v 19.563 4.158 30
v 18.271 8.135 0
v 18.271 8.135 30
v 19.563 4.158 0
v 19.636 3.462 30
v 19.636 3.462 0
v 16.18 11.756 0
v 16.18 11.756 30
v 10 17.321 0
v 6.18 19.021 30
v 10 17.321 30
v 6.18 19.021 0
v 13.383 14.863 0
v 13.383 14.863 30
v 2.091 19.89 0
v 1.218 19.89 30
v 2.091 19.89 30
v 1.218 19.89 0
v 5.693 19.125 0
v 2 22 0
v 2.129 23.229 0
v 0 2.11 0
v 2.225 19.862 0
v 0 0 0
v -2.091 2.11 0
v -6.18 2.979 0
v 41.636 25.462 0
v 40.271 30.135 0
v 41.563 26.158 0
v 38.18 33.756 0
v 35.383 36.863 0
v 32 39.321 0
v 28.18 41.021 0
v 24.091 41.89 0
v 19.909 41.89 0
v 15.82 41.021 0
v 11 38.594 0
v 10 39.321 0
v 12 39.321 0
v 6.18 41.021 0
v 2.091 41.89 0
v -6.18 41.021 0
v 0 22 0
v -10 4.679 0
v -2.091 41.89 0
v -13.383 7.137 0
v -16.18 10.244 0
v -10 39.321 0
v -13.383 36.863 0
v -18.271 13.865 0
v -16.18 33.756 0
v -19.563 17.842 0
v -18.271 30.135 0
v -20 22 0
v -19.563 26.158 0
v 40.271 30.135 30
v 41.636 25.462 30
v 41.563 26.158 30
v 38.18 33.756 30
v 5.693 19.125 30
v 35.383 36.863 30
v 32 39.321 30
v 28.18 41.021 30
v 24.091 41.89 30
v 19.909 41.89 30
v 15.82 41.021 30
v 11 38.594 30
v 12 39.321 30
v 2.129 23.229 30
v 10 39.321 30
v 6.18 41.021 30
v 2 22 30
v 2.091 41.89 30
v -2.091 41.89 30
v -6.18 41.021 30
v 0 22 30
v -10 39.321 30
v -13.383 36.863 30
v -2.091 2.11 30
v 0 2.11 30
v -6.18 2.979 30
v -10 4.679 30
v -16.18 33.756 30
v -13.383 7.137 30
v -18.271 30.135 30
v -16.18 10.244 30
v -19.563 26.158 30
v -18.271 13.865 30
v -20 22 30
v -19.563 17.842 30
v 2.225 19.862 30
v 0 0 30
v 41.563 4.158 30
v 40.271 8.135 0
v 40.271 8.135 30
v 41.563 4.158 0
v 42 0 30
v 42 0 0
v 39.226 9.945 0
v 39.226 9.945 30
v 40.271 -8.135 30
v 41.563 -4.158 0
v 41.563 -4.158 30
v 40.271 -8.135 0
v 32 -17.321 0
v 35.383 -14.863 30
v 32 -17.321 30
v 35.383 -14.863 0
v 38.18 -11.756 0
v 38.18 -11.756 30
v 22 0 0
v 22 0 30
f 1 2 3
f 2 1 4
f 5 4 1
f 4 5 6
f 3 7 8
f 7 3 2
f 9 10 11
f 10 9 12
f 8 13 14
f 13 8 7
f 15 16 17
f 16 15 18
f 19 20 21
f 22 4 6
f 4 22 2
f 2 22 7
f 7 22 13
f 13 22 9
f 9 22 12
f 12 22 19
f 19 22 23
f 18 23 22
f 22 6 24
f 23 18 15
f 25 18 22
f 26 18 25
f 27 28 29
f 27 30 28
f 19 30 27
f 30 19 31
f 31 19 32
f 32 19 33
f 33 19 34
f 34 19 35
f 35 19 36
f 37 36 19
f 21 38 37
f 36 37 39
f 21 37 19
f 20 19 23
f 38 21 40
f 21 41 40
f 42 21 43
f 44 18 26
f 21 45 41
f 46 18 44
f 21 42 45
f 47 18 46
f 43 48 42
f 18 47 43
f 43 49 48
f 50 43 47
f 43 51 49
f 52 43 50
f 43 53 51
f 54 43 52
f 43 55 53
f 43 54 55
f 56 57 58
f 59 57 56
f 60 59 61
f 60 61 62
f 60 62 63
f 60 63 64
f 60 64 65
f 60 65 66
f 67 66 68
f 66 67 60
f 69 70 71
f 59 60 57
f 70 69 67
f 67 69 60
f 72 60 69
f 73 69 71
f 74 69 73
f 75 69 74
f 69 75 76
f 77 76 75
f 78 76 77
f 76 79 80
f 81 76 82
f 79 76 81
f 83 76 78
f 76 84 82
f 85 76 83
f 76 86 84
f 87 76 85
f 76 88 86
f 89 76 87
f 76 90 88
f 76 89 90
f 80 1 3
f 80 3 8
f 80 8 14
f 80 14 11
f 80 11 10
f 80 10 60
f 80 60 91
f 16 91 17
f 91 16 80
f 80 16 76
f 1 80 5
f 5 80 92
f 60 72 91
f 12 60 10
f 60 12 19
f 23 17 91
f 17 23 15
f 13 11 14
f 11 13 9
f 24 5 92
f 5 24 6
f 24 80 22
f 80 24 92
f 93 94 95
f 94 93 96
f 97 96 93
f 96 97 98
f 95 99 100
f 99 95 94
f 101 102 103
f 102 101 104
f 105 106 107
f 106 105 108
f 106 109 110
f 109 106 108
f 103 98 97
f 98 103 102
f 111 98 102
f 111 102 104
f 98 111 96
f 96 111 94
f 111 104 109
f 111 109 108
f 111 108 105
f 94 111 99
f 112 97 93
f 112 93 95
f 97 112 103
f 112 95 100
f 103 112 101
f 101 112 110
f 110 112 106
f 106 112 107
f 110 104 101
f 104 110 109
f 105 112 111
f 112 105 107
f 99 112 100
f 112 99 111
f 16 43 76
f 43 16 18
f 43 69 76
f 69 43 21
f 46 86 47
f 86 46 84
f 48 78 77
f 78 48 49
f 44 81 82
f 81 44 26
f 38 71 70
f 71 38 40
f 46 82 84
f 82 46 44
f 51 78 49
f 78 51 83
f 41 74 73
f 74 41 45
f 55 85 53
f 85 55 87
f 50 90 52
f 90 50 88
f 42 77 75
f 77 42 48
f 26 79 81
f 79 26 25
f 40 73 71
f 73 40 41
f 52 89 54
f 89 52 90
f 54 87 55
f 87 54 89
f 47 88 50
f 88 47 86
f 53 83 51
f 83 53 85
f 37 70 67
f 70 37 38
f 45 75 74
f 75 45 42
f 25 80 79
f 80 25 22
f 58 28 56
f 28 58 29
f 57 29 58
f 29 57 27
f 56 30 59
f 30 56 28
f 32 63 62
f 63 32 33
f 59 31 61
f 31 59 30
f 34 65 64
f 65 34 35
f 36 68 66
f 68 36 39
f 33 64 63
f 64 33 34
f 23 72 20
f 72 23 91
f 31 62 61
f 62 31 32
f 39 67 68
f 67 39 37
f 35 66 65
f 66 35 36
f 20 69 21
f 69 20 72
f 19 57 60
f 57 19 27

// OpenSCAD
translate([0,0,0]) sector(30, 20, 10, 90);
translate([22,0,0]) sector(30, 20, 300, 30);
translate([0,22,0]) sector(30, 20, 30, 300);
translate([22,22,0]) sector(30, 20, 10, 190);

module sector(h, r, a1, a2) {
    d = 2 * r;
    if (a2 - a1 > 180) {
        difference() {
            cylinder(h=h, d=d);
            translate([0,0,-0.5]) sector(h+1, d+1, a2-360, a1); 
        }
    } else {
        difference() {
            cylinder(h=h, d=d);
            rotate([0,0,a1]) translate([-d/2, -d/2, -0.5])
                cube([d, d/2, h+1]);
            rotate([0,0,a2]) translate([-d/2, 0, -0.5])
                cube([d, d/2, h+1]);
        }
    }
}    
